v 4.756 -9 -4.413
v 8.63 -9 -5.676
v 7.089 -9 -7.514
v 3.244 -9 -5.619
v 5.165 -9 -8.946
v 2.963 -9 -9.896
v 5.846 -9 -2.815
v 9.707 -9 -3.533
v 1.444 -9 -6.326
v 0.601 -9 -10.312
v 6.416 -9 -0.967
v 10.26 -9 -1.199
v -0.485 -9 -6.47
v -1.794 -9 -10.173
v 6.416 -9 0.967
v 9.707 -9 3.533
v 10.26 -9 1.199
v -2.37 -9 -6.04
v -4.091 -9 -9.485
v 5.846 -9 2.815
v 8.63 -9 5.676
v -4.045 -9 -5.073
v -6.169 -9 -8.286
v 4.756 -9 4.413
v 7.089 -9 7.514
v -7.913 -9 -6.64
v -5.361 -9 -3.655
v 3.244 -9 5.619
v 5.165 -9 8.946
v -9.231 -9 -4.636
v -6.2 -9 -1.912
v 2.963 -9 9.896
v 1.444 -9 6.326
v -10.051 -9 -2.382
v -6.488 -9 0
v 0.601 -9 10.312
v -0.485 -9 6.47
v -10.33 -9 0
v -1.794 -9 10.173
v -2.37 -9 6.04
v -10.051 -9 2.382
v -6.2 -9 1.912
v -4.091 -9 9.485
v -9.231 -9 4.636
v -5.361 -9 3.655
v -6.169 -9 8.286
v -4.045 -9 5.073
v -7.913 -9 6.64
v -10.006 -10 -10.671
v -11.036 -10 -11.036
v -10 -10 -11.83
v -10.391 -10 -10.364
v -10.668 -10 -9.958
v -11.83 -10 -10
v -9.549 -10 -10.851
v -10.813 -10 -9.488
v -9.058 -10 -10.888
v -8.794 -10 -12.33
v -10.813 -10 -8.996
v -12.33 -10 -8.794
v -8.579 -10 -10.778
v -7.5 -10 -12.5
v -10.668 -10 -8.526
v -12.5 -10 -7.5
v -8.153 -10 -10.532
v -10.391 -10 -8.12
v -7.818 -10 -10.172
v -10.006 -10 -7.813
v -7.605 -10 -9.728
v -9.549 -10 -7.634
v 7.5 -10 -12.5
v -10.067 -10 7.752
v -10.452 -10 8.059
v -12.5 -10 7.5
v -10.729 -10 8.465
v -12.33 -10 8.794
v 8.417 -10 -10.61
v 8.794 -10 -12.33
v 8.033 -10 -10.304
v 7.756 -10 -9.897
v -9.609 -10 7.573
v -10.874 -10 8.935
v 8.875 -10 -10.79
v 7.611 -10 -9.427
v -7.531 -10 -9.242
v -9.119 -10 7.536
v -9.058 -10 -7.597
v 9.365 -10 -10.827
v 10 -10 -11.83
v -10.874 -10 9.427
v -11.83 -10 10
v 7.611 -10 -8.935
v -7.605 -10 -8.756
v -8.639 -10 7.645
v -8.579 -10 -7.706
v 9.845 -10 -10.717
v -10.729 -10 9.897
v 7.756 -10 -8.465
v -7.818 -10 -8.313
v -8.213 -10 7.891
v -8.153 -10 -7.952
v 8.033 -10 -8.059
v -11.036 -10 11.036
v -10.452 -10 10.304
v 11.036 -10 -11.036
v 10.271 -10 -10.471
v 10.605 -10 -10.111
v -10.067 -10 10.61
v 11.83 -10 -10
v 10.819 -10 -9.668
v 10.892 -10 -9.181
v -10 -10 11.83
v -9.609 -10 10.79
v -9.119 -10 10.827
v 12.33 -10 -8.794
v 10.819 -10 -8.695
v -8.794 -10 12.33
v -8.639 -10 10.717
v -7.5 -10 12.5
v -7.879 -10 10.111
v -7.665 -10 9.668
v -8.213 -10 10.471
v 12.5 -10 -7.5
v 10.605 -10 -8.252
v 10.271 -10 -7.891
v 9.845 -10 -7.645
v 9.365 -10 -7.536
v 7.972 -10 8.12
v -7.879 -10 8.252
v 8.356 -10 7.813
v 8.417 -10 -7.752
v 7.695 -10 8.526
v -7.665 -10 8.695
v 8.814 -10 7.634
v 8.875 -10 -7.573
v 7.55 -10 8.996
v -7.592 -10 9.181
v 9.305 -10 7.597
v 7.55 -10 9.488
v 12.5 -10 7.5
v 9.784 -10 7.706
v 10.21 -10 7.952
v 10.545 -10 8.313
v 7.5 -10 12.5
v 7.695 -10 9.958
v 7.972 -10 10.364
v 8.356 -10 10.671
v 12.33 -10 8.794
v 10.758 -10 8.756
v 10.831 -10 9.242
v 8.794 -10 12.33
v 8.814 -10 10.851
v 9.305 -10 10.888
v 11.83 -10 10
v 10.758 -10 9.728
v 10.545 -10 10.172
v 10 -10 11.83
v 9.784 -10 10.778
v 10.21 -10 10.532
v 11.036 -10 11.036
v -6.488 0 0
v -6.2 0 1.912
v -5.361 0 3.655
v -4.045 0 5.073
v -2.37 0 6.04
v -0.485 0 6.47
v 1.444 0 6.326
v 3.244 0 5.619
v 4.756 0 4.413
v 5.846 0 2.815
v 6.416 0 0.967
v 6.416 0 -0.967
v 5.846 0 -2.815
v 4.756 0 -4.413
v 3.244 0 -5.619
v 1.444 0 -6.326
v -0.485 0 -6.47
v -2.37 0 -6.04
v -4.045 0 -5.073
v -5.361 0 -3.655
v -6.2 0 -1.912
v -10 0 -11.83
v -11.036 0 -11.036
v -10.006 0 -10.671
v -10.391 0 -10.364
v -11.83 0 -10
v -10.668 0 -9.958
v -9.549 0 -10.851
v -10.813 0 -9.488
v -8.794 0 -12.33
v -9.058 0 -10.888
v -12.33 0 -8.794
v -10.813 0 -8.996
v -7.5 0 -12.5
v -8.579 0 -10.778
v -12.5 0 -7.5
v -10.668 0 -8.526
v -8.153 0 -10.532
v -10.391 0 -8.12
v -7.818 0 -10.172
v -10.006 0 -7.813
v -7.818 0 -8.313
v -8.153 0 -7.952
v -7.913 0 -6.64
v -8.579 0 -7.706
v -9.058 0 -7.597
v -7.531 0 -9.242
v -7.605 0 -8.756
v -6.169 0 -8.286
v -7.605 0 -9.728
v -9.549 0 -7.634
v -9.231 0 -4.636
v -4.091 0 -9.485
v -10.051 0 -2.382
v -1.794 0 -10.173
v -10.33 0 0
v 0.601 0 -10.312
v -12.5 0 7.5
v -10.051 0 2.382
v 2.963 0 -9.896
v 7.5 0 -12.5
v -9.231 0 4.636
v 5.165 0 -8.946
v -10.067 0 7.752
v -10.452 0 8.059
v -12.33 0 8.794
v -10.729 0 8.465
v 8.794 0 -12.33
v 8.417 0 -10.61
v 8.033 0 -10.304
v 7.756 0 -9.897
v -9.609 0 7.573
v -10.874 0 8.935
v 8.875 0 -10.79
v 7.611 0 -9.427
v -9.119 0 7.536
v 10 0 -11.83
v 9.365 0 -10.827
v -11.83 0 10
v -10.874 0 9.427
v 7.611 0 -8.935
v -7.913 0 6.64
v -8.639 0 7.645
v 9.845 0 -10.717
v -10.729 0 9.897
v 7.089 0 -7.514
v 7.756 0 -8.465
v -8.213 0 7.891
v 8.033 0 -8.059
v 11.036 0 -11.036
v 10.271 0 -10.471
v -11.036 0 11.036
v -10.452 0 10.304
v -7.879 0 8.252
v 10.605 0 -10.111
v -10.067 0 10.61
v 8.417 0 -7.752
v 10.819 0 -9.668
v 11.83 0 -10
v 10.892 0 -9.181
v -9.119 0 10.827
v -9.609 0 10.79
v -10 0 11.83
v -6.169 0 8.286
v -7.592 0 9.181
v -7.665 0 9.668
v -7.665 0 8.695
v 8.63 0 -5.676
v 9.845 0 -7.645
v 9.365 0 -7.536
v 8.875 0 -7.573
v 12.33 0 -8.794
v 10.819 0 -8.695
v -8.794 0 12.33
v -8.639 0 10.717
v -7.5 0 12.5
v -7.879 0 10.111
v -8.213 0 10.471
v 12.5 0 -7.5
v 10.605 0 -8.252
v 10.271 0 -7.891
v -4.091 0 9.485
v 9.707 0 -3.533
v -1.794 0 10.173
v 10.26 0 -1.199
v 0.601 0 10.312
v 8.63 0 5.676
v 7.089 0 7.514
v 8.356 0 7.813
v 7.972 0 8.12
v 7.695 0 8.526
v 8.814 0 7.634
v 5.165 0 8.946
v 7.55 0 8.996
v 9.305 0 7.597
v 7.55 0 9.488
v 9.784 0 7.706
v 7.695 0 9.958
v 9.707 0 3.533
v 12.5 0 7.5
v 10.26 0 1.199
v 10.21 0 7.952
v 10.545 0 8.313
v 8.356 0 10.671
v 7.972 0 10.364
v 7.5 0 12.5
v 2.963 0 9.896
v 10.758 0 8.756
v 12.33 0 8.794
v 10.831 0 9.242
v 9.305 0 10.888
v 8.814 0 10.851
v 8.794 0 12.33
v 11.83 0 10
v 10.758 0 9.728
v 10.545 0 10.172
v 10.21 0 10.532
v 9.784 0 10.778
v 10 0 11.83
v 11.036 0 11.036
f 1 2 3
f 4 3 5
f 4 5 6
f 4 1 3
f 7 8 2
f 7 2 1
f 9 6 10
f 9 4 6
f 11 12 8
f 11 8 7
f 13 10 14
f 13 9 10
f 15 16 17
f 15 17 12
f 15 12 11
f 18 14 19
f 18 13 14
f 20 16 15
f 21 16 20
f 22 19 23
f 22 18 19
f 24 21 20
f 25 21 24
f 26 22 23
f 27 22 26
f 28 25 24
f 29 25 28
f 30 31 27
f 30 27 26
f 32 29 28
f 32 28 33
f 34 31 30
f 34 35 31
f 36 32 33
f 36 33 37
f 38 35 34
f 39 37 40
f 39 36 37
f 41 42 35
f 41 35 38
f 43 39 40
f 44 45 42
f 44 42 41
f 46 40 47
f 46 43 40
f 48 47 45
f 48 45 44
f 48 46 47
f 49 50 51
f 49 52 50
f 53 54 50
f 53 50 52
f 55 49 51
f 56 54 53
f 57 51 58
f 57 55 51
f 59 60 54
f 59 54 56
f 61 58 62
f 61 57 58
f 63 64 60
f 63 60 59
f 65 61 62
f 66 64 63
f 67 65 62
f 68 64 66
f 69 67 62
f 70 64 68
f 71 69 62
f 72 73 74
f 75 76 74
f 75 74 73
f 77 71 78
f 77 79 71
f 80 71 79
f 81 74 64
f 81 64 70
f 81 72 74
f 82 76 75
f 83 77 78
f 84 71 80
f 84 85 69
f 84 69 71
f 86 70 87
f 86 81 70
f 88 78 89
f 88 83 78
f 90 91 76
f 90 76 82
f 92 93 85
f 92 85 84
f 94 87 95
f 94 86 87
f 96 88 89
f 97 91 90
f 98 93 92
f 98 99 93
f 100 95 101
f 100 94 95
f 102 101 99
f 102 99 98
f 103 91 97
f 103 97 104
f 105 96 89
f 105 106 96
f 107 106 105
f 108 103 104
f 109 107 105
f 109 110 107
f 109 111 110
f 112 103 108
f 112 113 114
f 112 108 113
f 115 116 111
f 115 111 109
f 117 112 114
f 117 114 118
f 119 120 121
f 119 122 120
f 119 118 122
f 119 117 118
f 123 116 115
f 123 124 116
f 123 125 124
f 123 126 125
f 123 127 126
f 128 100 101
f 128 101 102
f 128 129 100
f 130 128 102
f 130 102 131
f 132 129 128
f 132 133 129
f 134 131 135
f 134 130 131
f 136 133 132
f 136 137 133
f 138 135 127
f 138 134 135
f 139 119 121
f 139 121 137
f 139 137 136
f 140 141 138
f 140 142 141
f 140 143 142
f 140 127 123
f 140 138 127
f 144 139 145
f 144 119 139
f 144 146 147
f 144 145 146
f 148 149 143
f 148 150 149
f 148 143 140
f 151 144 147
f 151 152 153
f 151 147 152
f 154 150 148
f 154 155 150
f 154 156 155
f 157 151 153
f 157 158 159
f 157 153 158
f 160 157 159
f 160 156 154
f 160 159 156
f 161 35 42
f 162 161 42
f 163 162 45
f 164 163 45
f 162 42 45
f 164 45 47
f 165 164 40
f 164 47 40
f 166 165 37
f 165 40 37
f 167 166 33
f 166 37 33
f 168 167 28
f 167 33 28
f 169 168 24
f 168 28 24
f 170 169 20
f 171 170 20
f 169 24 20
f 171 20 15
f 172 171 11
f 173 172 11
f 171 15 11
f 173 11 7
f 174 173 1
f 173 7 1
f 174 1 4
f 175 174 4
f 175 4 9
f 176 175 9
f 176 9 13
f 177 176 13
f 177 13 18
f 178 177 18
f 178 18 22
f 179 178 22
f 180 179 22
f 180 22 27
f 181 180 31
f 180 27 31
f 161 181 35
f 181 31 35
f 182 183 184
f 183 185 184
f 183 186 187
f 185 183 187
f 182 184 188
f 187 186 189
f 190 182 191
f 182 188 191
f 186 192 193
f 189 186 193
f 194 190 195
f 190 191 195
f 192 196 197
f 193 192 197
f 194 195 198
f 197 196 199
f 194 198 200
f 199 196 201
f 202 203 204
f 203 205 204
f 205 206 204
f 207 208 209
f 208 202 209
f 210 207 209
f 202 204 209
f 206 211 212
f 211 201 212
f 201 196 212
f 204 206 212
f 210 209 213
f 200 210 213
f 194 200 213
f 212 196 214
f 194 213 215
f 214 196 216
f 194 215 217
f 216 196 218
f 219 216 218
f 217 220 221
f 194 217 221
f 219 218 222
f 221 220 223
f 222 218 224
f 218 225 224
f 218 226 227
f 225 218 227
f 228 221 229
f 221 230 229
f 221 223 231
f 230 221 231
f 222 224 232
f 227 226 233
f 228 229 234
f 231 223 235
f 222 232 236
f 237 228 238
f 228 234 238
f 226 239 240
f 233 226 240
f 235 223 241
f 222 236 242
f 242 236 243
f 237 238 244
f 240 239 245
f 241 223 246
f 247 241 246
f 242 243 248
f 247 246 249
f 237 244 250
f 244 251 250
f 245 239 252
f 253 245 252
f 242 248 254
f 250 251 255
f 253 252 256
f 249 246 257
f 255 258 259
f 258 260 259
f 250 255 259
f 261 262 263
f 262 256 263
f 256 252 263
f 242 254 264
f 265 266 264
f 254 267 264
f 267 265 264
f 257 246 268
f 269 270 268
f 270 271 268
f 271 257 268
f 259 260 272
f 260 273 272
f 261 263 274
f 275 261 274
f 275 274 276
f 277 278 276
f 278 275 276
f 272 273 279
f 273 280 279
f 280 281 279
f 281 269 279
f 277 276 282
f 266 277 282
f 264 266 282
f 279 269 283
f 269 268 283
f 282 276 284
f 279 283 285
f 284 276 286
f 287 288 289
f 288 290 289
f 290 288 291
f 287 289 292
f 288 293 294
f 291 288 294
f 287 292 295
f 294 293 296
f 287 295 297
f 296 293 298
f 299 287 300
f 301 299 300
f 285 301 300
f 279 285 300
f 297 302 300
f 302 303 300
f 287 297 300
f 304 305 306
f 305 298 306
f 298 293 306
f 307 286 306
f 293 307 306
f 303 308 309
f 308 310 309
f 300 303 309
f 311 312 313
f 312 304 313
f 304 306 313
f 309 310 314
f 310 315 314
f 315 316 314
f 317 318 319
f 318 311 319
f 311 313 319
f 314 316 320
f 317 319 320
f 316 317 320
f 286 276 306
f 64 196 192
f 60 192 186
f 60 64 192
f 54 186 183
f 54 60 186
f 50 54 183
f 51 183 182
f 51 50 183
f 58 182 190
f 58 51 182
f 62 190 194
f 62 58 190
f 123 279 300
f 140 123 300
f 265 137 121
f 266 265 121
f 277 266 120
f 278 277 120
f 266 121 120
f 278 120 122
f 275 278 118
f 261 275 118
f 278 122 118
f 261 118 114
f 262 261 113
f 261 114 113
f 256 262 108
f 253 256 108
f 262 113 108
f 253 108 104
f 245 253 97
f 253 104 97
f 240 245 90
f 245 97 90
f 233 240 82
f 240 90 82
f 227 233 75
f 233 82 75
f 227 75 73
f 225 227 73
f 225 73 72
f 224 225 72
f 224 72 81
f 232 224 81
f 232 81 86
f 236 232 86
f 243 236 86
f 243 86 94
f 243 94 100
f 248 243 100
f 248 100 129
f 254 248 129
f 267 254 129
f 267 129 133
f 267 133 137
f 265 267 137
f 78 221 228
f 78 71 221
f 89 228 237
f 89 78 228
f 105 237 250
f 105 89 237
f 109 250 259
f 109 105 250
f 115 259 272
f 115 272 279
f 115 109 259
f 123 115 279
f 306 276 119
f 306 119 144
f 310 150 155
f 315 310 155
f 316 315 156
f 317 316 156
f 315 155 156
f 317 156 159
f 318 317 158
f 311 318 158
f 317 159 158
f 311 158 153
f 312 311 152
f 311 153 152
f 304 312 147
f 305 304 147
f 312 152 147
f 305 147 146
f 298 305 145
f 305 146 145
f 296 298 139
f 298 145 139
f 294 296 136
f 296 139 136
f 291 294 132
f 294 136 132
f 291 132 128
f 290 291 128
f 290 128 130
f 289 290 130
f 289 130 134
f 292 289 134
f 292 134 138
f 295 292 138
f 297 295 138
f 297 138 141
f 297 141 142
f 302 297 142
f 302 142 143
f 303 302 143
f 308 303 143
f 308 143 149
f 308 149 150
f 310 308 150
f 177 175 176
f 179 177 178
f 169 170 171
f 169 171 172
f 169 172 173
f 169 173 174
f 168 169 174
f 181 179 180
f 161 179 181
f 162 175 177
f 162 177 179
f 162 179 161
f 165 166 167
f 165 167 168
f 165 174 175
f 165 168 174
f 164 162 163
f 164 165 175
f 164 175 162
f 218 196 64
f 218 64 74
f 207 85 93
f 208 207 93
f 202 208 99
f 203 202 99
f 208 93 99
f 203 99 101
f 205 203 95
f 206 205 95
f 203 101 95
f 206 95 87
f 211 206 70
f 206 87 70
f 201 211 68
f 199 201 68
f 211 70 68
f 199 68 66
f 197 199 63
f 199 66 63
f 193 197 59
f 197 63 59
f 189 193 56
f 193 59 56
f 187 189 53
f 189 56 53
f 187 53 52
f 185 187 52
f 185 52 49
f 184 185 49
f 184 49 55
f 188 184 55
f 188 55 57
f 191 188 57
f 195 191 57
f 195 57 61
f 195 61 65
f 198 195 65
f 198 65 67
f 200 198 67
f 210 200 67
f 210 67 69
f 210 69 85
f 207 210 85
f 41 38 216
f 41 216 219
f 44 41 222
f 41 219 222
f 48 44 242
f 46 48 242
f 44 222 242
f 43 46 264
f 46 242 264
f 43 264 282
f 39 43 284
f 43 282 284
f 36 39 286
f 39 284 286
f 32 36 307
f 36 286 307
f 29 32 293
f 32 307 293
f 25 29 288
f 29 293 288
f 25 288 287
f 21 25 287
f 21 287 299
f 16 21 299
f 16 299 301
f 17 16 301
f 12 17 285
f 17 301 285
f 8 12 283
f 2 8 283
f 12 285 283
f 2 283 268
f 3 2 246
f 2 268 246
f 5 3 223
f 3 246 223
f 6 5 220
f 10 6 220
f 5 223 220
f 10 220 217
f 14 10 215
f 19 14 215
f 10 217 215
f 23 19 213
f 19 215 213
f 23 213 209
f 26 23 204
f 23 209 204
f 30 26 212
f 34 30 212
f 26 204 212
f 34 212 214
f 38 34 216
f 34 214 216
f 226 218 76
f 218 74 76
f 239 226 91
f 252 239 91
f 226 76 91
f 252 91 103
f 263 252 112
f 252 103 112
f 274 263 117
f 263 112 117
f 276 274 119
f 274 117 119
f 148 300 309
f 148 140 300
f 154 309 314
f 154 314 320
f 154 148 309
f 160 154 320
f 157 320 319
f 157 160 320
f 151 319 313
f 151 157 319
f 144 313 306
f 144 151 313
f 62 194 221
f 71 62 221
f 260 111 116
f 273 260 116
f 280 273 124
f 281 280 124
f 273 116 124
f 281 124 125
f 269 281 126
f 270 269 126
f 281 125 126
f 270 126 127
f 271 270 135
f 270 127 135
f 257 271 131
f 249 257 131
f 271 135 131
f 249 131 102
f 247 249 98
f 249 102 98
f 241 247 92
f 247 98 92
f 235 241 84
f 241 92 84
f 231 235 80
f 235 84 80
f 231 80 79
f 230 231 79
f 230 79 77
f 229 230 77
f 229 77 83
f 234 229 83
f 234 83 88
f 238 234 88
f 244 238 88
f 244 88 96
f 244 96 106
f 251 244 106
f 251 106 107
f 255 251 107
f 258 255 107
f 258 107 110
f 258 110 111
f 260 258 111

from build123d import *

# Parameters (mm, degrees)
F0_W     = 25
F0_H     = 25
F1_DEPTH = 10
F2_R     = 5
F3_R     = 10.3297635793
F4_DEPTH = 9
F5_R     = 6.488280321
F6_DEPTH = 9
F8_D     = 3.3


with BuildPart() as f1:
    # F0 (on Front) → F1 (new body)
    with BuildSketch(Plane.XZ):
        Rectangle(F0_W, F0_H)
    extrude(amount=F1_DEPTH)

    # F2
    f2_edges = [f1.edges().sort_by_distance(p)[0] for p in [
        (12.5, -5, 12.5),
        (12.5, -5, -12.5),
        (-12.5, -5, 12.5),
        (-12.5, -5, -12.5),
    ]]
    fillet(f2_edges, radius=F2_R)

    # F3 (on face) → F4 (cut)
    with BuildSketch(Plane(origin=(0, 0, 0), x_dir=(-1, 0, 0), z_dir=(0, 1, 0))):
        Circle(F3_R)
    extrude(amount=-F4_DEPTH, mode=Mode.SUBTRACT)

    # F5 (on face) → F6 (join)
    with BuildSketch(Plane(origin=(0, -9, 0), x_dir=(-1, 0, 0), z_dir=(0, 1, 0))):
        Circle(F5_R)
    extrude(amount=F6_DEPTH)

    # F8 (through all)
    with Locations(Plane(origin=(0, 0, 0), x_dir=(-1, 0, 0), z_dir=(0, 1, 0))):
        with Locations((9.2421416193, 9.181400761), (9.181400761, -9.2421416193), (-9.2421416193, -9.181400761), (-9.181400761, 9.2421416193)):
            Hole(F8_D / 2)


solid = f1.part
